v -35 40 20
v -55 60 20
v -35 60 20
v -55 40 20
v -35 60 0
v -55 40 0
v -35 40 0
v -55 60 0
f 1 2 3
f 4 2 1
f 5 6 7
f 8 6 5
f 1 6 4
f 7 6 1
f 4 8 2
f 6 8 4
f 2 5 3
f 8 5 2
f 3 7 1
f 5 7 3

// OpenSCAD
//
// STL to SCAD Conversion
// name: binary stl file
// volume: 8000.0
// bbox: [-55.0, 40.0, 0.0] to [-35.0, 60.0, 20.0]
//

polyhedron(
  points=[
    [-55.000000, 40.000000, 0.000000],
    [-55.000000, 40.000000, 20.000000],
    [-55.000000, 60.000000, 0.000000],
    [-55.000000, 60.000000, 20.000000],
    [-35.000000, 40.000000, 0.000000],
    [-35.000000, 40.000000, 20.000000],
    [-35.000000, 60.000000, 0.000000],
    [-35.000000, 60.000000, 20.000000],
  ],
  faces=[
    [7, 3, 5],
    [5, 3, 1],
    [4, 0, 6],
    [6, 0, 2],
    [1, 0, 5],
    [5, 0, 4],
    [3, 2, 1],
    [1, 2, 0],
    [7, 6, 3],
    [3, 6, 2],
    [5, 4, 7],
    [7, 4, 6],
  ],
  convexity=10
);
